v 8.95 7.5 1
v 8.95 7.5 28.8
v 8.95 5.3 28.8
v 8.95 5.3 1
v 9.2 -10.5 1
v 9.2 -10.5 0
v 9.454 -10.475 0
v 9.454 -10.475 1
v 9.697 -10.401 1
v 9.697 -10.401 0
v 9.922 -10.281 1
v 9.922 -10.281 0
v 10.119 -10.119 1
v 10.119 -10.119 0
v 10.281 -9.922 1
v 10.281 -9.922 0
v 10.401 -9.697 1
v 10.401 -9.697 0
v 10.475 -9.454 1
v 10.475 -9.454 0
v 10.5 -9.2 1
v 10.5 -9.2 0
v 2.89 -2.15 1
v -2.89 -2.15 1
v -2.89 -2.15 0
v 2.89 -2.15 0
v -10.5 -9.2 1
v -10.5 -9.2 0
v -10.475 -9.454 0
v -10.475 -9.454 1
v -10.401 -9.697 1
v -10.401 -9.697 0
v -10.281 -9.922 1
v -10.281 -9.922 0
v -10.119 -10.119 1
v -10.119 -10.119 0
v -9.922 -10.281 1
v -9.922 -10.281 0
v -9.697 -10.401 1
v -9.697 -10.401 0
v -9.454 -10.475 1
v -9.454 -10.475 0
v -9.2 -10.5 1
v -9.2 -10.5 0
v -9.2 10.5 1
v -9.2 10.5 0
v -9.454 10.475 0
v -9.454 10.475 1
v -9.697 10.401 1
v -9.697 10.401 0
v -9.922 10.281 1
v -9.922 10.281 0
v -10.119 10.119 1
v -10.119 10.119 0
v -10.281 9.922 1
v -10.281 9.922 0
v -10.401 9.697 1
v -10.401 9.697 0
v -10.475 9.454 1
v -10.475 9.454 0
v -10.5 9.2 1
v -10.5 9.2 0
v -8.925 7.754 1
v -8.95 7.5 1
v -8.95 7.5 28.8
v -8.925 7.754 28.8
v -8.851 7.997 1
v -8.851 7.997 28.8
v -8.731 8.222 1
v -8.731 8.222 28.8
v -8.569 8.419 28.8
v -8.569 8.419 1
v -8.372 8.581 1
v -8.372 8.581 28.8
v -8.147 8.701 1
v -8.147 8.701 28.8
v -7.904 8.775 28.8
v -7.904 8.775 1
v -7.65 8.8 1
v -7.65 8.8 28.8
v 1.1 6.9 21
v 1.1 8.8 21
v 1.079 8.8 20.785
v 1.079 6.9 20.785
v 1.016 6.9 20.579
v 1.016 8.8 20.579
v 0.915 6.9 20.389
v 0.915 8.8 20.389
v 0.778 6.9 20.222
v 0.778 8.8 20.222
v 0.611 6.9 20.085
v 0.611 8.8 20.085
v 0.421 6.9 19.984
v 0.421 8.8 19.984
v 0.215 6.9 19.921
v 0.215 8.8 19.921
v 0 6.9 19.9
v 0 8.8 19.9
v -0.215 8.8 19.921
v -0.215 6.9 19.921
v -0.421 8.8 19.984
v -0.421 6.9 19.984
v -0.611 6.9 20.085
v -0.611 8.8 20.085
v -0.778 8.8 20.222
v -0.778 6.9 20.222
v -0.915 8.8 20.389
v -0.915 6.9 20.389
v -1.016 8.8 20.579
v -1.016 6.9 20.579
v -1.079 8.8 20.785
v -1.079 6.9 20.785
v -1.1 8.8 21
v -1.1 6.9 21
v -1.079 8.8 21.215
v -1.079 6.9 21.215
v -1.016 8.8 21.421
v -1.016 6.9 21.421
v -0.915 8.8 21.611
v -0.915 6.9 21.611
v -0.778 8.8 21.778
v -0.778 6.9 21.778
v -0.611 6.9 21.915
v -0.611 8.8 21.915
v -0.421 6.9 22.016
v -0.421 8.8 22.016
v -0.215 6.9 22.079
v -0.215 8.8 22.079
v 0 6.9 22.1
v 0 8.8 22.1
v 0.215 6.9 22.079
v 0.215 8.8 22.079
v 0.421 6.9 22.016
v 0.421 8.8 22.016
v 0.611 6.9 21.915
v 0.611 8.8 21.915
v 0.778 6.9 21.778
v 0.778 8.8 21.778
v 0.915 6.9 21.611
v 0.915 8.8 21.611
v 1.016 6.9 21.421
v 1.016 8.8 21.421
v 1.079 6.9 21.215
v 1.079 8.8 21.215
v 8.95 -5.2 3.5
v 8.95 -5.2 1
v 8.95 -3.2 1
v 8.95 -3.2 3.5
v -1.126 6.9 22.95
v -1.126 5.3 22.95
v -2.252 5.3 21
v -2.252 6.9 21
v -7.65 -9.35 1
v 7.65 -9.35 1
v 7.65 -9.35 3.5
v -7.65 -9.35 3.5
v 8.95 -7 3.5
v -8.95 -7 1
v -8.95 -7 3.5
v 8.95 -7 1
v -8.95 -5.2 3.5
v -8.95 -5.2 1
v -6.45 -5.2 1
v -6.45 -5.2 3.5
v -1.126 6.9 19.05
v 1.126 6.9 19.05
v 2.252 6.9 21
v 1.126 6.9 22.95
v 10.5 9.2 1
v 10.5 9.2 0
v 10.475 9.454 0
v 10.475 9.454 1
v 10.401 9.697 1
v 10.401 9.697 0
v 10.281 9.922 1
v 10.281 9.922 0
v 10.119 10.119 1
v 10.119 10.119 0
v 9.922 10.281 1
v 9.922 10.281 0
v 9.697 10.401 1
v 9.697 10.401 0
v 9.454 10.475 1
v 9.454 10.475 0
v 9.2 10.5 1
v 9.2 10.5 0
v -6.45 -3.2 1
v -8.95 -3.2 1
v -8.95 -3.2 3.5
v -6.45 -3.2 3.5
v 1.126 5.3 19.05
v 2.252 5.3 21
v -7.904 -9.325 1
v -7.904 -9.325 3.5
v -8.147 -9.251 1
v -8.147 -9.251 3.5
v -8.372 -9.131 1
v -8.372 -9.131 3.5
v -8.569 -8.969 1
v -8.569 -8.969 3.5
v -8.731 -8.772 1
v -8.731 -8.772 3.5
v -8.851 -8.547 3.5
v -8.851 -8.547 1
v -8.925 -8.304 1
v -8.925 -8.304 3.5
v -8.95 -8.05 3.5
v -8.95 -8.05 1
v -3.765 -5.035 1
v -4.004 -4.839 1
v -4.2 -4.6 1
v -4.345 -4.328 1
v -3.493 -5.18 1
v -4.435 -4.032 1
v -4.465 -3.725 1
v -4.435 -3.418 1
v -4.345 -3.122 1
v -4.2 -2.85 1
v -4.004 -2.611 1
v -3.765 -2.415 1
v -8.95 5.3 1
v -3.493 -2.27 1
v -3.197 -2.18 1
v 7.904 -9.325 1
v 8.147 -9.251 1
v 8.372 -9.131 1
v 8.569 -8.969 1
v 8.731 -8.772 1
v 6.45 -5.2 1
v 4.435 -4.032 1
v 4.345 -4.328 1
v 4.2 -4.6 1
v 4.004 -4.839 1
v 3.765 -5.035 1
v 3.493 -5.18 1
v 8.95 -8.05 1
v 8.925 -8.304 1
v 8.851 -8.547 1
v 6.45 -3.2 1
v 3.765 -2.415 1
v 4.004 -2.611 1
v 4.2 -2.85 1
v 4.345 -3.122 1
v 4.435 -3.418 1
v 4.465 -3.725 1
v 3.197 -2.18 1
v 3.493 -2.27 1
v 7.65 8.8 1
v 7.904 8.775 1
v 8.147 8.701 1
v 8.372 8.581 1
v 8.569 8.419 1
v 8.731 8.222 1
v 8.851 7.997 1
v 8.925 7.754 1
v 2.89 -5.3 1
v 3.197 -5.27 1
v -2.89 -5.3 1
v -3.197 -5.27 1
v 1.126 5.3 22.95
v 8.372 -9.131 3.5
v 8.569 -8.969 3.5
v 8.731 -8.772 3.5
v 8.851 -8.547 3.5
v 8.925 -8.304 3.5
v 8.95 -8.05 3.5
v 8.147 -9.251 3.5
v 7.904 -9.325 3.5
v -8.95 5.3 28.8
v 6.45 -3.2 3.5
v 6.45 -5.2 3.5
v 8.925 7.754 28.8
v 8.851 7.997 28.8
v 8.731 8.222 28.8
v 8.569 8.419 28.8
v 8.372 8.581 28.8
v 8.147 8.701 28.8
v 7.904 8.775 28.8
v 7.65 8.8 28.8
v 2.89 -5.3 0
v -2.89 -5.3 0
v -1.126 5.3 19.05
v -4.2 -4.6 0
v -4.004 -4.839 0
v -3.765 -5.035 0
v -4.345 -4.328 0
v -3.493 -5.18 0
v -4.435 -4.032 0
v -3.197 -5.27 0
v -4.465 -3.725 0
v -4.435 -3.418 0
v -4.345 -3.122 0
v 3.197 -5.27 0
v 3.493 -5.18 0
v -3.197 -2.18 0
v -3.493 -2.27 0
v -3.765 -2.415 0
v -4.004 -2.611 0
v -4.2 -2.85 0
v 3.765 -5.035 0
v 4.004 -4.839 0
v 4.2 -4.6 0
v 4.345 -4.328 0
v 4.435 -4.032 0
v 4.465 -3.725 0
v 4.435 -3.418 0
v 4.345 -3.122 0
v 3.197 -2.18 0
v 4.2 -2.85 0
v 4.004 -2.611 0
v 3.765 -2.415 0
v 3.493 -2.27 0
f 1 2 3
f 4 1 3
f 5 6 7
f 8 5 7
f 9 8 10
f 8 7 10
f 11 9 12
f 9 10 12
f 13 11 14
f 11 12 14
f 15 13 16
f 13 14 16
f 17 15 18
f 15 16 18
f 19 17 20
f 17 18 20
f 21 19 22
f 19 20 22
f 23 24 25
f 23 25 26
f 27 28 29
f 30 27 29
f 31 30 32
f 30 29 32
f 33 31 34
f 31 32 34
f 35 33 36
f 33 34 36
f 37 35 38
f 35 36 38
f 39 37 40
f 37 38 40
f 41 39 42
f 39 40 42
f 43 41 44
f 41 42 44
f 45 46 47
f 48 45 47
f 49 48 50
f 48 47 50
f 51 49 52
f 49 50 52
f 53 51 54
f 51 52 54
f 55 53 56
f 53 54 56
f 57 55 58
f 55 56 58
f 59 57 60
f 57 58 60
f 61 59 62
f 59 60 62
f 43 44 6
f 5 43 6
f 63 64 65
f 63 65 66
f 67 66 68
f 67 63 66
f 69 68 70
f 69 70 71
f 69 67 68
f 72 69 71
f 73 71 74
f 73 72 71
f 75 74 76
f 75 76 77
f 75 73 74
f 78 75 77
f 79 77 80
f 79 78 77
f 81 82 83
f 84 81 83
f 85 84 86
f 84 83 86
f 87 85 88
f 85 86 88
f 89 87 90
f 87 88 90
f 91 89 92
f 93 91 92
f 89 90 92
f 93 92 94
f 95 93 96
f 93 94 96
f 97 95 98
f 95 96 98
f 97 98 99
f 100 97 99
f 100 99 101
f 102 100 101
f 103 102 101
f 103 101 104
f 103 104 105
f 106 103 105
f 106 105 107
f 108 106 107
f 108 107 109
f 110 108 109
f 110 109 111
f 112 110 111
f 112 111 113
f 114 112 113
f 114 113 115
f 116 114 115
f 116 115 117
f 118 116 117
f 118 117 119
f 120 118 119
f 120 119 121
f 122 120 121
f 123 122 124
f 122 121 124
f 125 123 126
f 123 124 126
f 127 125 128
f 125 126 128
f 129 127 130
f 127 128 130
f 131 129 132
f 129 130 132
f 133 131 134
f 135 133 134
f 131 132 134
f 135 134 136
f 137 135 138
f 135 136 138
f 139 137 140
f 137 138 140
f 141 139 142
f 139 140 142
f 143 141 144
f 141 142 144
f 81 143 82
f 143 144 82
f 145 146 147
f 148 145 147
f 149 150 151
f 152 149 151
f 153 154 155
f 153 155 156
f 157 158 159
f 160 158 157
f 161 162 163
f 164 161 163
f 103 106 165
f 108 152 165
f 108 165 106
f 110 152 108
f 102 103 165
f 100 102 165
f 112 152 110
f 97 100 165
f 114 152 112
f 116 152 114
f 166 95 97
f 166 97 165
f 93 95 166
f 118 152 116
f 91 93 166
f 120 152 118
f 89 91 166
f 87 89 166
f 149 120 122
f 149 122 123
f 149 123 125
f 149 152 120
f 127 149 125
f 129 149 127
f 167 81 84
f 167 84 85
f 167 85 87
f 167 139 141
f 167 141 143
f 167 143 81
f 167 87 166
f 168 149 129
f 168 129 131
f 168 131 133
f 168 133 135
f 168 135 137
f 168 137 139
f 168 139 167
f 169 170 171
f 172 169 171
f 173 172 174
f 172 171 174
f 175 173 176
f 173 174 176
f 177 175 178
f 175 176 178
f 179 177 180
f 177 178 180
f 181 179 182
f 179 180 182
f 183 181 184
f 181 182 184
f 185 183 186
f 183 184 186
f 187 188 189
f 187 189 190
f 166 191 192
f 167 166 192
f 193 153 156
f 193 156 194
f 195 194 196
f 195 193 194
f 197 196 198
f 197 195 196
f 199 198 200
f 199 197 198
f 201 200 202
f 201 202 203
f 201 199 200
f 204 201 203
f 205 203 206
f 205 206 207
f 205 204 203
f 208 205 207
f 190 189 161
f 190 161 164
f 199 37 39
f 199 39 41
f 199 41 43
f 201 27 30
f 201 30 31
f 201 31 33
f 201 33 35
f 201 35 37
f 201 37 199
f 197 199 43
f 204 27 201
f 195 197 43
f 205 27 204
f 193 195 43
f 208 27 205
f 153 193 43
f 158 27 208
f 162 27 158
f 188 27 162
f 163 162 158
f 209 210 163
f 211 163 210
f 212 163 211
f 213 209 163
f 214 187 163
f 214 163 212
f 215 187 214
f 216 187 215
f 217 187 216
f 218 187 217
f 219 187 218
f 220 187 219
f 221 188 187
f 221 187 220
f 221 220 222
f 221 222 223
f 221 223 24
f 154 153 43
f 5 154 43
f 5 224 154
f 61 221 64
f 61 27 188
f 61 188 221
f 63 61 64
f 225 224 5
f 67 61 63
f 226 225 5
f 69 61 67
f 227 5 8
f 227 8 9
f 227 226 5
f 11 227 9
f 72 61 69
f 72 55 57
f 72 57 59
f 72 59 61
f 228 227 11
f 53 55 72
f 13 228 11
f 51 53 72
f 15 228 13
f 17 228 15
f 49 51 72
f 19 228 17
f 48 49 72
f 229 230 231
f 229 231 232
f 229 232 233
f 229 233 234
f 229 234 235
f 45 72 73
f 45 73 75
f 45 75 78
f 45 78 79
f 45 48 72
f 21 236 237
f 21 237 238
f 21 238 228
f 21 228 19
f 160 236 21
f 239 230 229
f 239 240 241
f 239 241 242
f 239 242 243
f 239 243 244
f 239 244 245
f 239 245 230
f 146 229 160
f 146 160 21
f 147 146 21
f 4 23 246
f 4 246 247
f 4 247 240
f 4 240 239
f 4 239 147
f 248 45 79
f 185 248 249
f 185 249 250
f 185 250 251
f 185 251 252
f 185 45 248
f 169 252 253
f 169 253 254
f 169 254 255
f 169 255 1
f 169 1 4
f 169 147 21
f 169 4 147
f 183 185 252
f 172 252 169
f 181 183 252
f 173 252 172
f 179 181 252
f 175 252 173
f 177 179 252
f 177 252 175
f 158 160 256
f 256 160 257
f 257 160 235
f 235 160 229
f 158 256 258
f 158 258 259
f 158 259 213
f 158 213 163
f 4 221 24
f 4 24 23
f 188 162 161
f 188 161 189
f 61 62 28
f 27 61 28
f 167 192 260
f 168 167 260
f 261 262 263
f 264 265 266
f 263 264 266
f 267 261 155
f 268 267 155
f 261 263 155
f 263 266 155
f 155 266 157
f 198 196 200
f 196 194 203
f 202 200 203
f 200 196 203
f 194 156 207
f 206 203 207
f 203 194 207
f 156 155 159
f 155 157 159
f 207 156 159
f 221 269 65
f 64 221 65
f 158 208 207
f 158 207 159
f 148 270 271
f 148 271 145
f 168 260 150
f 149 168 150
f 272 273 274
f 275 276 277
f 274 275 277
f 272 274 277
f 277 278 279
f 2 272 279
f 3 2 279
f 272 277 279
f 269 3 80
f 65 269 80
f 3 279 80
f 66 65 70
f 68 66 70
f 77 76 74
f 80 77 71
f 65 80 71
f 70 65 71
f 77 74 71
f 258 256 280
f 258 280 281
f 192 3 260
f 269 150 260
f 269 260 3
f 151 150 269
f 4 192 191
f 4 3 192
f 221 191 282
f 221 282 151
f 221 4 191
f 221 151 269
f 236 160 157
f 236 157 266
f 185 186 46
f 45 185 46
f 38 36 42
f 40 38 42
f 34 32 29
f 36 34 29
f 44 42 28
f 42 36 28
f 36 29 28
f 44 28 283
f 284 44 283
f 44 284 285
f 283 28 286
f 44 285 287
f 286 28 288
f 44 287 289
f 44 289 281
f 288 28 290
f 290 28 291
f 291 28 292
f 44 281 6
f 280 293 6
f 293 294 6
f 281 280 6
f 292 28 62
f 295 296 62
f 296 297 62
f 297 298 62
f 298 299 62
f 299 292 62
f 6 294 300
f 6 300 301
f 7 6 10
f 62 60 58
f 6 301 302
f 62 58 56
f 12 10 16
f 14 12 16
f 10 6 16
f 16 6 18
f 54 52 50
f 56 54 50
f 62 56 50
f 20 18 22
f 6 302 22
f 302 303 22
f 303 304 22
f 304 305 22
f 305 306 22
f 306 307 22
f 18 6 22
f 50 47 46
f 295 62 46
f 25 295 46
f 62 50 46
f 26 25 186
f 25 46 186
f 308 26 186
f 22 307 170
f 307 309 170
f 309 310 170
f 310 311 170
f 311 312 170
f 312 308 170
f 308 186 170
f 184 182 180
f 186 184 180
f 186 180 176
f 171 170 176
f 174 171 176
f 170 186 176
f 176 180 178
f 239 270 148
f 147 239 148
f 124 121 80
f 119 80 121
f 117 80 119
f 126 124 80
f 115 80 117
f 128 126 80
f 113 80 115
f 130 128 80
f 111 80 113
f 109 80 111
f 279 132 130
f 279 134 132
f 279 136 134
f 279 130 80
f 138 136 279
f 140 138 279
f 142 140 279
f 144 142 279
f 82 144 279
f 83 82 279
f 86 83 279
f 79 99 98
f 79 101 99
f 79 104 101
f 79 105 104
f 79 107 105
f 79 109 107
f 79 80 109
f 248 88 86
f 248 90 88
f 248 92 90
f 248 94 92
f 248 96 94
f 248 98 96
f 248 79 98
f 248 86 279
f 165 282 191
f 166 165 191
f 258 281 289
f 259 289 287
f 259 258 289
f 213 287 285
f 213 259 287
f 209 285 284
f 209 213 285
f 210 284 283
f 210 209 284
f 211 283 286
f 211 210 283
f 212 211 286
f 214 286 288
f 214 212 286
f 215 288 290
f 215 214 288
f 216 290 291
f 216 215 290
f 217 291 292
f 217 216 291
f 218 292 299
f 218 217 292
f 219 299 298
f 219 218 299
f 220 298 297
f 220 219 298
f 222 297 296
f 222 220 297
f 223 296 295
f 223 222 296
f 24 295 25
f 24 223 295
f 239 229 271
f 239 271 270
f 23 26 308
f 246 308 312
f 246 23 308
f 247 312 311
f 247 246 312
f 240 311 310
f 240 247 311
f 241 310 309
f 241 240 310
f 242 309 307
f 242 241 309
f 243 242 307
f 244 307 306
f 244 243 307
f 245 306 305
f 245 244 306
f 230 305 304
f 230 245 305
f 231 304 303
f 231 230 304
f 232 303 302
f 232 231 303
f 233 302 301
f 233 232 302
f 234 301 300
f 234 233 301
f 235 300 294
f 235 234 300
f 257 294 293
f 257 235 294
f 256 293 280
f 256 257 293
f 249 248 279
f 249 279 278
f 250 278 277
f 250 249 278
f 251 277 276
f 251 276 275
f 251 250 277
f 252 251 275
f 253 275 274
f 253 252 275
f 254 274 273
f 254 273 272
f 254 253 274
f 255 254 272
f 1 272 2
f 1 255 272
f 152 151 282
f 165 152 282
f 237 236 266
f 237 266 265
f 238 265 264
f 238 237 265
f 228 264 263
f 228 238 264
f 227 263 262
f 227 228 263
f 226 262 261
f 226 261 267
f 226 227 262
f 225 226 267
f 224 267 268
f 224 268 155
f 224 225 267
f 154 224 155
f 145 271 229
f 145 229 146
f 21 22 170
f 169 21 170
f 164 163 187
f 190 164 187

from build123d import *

# Parameters (mm, degrees)
EXTRUDE_1_DEPTH     = 1
SKETCH_3_W          = 2.5
SKETCH_3_H          = 2
EXTRUDE_2_DEPTH     = 2.5
CUT_EXTRUDE_1_DEPTH = 2
EXTRUDE_3_DEPTH     = 27.8
SKETCH_5_R          = 1.1
CUT_EXTRUDE_2_DEPTH = 20.3
CUT_EXTRUDE_3_DEPTH = 1.6


with BuildPart() as part:
    # 草图1 → 凸台-拉伸1 (new body)
    with BuildSketch(Plane.XY):
        with BuildLine():
            Line((-9.2, -10.5), (9.2, -10.5))
            ThreePointArc((9.2, -10.5), (10.119238816, -10.119238816), (10.5, -9.2))
            Line((10.5, -9.2), (10.5, 9.2))
            ThreePointArc((10.5, 9.2), (10.119238816, 10.119238816), (9.2, 10.5))
            Line((9.2, 10.5), (-9.2, 10.5))
            ThreePointArc((-9.2, 10.5), (-10.119238816, 10.119238816), (-10.5, 9.2))
            Line((-10.5, 9.2), (-10.5, -9.2))
            ThreePointArc((-10.5, -9.2), (-10.119238816, -10.119238816), (-9.2, -10.5))
        make_face()
    extrude(amount=EXTRUDE_1_DEPTH)

    # 草图3 → 凸台-拉伸2 (add)
    with BuildSketch(Plane.XY.offset(1)):
        with Locations((7.7, -4.2)):
            Rectangle(SKETCH_3_W, SKETCH_3_H)
        with Locations((-7.7, -4.2)):
            Rectangle(SKETCH_3_W, SKETCH_3_H)
        with BuildLine():
            Line((-8.95, -7), (8.95, -7))
            Line((8.95, -7), (8.95, -8.05))
            ThreePointArc((8.95, -8.05), (8.569238816, -8.969238816), (7.65, -9.35))
            Line((7.65, -9.35), (-7.65, -9.35))
            ThreePointArc((-7.65, -9.35), (-8.569238816, -8.969238816), (-8.95, -8.05))
            Line((-8.95, -8.05), (-8.95, -7))
        make_face()
    extrude(amount=EXTRUDE_2_DEPTH)

    # 草图2 → 切除-拉伸1 (cut, through all)
    with BuildSketch(Plane.XY.offset(1)):
        with BuildLine():
            Line((-2.89, -2.15), (2.89, -2.15))
            ThreePointArc((2.89, -2.15), (4.465, -3.725), (2.89, -5.3))
            Line((2.89, -5.3), (-2.89, -5.3))
            ThreePointArc((-2.89, -5.3), (-4.465, -3.725), (-2.89, -2.15))
        make_face()
    extrude(amount=-CUT_EXTRUDE_1_DEPTH, mode=Mode.SUBTRACT)

    # 草图4 → 凸台-拉伸3 (add)
    with BuildSketch(Plane.XY.offset(1)):
        with BuildLine():
            Line((-7.65, 8.8), (7.65, 8.8))
            ThreePointArc((7.65, 8.8), (8.569238816, 8.419238816), (8.95, 7.5))
            Line((8.95, 7.5), (8.95, 5.3))
            Line((8.95, 5.3), (-8.95, 5.3))
            Line((-8.95, 5.3), (-8.95, 7.5))
            ThreePointArc((-8.95, 7.5), (-8.569238816, 8.419238816), (-7.65, 8.8))
        make_face()
    extrude(amount=EXTRUDE_3_DEPTH)

    # 草图5 → 切除-拉伸2 (cut, through all)
    with BuildSketch(Plane(origin=(0, 8.8, 0), x_dir=(1, 0, 0), z_dir=(0, 1, 0))):
        with Locations((0, -21)):
            Circle(SKETCH_5_R)
    extrude(amount=-CUT_EXTRUDE_2_DEPTH, mode=Mode.SUBTRACT)

    # 草图6 → 切除-拉伸3 (cut)
    with BuildSketch(Plane.XZ.offset(-5.3)):
        Polygon((1.125833025, 22.95), (-1.125833025, 22.95), (-2.25166605, 21), (-1.125833025, 19.05), (1.125833025, 19.05), (2.25166605, 21), align=None)
    extrude(amount=-CUT_EXTRUDE_3_DEPTH, mode=Mode.SUBTRACT)


solid = part.part
